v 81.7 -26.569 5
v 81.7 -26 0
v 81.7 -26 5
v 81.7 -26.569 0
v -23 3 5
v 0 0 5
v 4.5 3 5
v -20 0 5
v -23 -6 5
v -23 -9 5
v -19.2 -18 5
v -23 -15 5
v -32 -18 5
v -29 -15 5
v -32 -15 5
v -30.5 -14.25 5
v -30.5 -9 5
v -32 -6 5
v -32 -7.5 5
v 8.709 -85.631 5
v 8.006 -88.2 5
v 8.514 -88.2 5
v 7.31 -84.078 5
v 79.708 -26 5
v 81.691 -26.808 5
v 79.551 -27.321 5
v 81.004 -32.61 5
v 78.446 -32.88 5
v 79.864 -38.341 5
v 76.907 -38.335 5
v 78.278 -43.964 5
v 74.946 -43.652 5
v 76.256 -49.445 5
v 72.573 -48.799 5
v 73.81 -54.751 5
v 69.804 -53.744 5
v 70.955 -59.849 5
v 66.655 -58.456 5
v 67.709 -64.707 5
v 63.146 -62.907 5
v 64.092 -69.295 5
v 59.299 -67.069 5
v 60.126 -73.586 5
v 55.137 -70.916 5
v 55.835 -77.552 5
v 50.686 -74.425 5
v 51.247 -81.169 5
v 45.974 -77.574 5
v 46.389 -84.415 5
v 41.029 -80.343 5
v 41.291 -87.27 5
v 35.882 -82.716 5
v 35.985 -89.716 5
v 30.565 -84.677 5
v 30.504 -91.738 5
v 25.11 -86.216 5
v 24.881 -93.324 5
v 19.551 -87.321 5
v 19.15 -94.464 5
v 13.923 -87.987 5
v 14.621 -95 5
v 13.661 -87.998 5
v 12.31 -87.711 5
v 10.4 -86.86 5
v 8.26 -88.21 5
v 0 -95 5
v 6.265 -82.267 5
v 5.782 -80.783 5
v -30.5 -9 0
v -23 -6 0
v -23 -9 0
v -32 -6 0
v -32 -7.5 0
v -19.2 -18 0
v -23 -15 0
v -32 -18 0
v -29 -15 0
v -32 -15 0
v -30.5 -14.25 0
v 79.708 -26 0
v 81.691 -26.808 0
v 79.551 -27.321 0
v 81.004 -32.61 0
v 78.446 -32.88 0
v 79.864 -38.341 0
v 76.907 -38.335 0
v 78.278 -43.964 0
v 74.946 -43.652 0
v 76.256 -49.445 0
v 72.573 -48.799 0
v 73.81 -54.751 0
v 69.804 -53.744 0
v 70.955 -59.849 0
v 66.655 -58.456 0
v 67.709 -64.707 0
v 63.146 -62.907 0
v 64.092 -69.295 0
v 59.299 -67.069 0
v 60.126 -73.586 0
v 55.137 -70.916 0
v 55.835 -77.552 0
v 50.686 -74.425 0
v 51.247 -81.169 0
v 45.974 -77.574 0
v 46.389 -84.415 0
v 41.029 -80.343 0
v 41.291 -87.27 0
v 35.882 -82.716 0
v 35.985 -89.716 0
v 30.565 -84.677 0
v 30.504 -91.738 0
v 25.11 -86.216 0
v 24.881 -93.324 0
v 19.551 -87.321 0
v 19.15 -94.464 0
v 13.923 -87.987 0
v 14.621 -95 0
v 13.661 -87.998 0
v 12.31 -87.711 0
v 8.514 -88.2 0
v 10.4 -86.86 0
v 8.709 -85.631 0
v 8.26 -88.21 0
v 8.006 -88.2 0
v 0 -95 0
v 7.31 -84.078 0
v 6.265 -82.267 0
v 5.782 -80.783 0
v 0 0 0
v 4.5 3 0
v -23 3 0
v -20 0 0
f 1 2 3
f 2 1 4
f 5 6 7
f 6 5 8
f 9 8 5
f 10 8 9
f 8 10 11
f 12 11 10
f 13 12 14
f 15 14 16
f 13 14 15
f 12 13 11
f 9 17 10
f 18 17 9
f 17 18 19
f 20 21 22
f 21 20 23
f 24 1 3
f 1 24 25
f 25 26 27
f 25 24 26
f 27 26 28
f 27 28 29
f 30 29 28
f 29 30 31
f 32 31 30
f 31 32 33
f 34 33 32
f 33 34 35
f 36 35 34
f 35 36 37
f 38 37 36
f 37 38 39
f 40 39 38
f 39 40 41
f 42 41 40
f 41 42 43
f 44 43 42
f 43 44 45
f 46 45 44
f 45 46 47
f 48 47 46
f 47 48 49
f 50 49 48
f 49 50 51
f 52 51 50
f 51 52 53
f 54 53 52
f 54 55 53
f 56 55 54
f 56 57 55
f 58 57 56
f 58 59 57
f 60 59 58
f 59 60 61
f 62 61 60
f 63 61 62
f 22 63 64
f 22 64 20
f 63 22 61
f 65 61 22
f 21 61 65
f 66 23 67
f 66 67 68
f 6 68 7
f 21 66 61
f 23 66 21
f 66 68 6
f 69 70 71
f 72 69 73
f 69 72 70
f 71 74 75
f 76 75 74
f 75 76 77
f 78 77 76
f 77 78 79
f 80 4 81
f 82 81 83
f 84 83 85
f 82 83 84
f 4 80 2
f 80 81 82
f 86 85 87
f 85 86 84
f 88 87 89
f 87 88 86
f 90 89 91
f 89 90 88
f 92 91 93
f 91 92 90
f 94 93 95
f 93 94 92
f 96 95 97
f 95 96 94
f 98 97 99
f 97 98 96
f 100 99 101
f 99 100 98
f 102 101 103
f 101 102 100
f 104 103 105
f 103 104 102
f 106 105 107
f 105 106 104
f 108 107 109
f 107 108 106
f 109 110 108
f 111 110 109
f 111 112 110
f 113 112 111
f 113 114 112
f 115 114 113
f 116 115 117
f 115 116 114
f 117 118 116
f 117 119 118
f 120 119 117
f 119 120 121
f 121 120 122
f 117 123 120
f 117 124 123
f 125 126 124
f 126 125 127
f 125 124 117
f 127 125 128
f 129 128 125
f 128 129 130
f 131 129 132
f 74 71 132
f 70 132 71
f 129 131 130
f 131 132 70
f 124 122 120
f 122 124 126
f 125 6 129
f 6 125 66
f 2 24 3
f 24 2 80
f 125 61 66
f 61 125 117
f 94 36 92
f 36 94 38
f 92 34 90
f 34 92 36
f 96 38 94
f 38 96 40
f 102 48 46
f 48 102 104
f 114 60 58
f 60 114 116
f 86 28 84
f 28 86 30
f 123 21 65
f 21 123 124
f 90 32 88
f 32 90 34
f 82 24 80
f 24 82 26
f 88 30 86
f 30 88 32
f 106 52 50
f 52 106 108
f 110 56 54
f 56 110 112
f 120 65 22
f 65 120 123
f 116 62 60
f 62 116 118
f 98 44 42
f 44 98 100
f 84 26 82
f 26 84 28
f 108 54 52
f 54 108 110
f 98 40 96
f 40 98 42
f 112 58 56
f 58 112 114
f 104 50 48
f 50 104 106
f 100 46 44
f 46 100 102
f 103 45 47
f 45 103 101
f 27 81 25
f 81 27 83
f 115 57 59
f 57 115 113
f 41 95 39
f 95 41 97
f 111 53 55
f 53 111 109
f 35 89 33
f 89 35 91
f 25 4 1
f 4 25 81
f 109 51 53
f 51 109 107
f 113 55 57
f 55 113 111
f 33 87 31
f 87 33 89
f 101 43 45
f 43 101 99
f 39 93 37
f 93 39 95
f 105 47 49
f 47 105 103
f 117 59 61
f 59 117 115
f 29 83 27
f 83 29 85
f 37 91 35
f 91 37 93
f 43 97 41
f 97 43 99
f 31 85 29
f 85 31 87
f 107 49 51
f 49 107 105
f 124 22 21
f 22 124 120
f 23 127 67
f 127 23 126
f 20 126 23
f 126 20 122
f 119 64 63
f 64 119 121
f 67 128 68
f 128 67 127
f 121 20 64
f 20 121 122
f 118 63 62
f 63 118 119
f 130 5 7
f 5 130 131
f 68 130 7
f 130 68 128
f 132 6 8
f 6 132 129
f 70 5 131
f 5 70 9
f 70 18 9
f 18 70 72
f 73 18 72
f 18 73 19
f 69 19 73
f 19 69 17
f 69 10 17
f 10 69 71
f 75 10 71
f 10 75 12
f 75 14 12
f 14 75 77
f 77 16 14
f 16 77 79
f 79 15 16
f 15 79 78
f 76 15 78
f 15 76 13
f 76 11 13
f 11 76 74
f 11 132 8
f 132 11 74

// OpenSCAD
// Height from top of wall to bottom of hayrack
main_height = 95;

// Thickness of wall where rack will be mounted
wall_width = 20;

// Height of wooden bar
bar_height = 6;

// Width of wooden bar
bar_width = 6;

// Length of wooden bar fixation
fixation_height = 18;

// Thickness
depth = 5;

/* [Hidden] */
fixation_width=3;

module fixation () {
  linear_extrude(height=depth)polygon(points=[
	[0,0],
	[-wall_width,0],
   [-wall_width+0.8, -fixation_height],
   [-wall_width-fixation_width-bar_width-fixation_width,-fixation_height],
   [-wall_width-fixation_width-bar_width-fixation_width,-fixation_height+fixation_width],
   [-wall_width-fixation_width-bar_width-fixation_width/2, -fixation_height+fixation_width+fixation_width*0.25],
   [-wall_width-fixation_width-bar_width,-fixation_height+fixation_width],
   [-wall_width-fixation_width,-fixation_height+fixation_width], // Point 8
   [-wall_width-fixation_width,-fixation_height+fixation_width+bar_height],
   [-wall_width-fixation_width-bar_width-fixation_width/2,-fixation_height+fixation_width+bar_height],
   [-wall_width-fixation_width-bar_width-fixation_width,-fixation_height+fixation_width+bar_height+fixation_width/2],
   [-wall_width-fixation_width-bar_width-fixation_width,-fixation_height+fixation_width+bar_height+fixation_width],
   [-wall_width-fixation_width,-fixation_height+2*fixation_width+bar_height],
   [-wall_width-fixation_width,fixation_width],
   [0, fixation_width],
]);
}



module rack () {
  lower_curve_radius = 10;
  lower_curve_center = [fixation_width*1.8+lower_curve_radius,-main_height+16.8,0];
  inner_hook_center = [8.26,-main_height+78.97,0];
  inner_hook_radius = 72.18;
  outer_hook_center = [7.51, -main_height+74.03,0];
  outer_hook_radius = 74.41; 

  hook_x = 81.7;
  hook_y = 69; //main_height - 26.2;

  linear_extrude(height=depth)polygon(points=[
	[0,fixation_width],
   [0,-main_height],
   [fixation_width*2,-main_height],
   [fixation_width*1.5,fixation_width]
]);

  intersection(){
    difference() {
      translate([0,-main_height,0])cube([hook_x, hook_y, depth]);
        
      translate([0,0,-0.5])translate(inner_hook_center)cylinder(r=inner_hook_radius,depth+1, $fn=80);
    }
    translate(outer_hook_center)cylinder(r=outer_hook_radius, depth, $fn=80);
  }
  translate(lower_curve_center)difference(){
    translate([-lower_curve_radius,-lower_curve_radius,0])cube([lower_curve_radius,lower_curve_radius,depth]);
    translate([0,0,-0.5])cylinder(r=lower_curve_radius, h=depth+1);
  }
}



fixation();
rack();
